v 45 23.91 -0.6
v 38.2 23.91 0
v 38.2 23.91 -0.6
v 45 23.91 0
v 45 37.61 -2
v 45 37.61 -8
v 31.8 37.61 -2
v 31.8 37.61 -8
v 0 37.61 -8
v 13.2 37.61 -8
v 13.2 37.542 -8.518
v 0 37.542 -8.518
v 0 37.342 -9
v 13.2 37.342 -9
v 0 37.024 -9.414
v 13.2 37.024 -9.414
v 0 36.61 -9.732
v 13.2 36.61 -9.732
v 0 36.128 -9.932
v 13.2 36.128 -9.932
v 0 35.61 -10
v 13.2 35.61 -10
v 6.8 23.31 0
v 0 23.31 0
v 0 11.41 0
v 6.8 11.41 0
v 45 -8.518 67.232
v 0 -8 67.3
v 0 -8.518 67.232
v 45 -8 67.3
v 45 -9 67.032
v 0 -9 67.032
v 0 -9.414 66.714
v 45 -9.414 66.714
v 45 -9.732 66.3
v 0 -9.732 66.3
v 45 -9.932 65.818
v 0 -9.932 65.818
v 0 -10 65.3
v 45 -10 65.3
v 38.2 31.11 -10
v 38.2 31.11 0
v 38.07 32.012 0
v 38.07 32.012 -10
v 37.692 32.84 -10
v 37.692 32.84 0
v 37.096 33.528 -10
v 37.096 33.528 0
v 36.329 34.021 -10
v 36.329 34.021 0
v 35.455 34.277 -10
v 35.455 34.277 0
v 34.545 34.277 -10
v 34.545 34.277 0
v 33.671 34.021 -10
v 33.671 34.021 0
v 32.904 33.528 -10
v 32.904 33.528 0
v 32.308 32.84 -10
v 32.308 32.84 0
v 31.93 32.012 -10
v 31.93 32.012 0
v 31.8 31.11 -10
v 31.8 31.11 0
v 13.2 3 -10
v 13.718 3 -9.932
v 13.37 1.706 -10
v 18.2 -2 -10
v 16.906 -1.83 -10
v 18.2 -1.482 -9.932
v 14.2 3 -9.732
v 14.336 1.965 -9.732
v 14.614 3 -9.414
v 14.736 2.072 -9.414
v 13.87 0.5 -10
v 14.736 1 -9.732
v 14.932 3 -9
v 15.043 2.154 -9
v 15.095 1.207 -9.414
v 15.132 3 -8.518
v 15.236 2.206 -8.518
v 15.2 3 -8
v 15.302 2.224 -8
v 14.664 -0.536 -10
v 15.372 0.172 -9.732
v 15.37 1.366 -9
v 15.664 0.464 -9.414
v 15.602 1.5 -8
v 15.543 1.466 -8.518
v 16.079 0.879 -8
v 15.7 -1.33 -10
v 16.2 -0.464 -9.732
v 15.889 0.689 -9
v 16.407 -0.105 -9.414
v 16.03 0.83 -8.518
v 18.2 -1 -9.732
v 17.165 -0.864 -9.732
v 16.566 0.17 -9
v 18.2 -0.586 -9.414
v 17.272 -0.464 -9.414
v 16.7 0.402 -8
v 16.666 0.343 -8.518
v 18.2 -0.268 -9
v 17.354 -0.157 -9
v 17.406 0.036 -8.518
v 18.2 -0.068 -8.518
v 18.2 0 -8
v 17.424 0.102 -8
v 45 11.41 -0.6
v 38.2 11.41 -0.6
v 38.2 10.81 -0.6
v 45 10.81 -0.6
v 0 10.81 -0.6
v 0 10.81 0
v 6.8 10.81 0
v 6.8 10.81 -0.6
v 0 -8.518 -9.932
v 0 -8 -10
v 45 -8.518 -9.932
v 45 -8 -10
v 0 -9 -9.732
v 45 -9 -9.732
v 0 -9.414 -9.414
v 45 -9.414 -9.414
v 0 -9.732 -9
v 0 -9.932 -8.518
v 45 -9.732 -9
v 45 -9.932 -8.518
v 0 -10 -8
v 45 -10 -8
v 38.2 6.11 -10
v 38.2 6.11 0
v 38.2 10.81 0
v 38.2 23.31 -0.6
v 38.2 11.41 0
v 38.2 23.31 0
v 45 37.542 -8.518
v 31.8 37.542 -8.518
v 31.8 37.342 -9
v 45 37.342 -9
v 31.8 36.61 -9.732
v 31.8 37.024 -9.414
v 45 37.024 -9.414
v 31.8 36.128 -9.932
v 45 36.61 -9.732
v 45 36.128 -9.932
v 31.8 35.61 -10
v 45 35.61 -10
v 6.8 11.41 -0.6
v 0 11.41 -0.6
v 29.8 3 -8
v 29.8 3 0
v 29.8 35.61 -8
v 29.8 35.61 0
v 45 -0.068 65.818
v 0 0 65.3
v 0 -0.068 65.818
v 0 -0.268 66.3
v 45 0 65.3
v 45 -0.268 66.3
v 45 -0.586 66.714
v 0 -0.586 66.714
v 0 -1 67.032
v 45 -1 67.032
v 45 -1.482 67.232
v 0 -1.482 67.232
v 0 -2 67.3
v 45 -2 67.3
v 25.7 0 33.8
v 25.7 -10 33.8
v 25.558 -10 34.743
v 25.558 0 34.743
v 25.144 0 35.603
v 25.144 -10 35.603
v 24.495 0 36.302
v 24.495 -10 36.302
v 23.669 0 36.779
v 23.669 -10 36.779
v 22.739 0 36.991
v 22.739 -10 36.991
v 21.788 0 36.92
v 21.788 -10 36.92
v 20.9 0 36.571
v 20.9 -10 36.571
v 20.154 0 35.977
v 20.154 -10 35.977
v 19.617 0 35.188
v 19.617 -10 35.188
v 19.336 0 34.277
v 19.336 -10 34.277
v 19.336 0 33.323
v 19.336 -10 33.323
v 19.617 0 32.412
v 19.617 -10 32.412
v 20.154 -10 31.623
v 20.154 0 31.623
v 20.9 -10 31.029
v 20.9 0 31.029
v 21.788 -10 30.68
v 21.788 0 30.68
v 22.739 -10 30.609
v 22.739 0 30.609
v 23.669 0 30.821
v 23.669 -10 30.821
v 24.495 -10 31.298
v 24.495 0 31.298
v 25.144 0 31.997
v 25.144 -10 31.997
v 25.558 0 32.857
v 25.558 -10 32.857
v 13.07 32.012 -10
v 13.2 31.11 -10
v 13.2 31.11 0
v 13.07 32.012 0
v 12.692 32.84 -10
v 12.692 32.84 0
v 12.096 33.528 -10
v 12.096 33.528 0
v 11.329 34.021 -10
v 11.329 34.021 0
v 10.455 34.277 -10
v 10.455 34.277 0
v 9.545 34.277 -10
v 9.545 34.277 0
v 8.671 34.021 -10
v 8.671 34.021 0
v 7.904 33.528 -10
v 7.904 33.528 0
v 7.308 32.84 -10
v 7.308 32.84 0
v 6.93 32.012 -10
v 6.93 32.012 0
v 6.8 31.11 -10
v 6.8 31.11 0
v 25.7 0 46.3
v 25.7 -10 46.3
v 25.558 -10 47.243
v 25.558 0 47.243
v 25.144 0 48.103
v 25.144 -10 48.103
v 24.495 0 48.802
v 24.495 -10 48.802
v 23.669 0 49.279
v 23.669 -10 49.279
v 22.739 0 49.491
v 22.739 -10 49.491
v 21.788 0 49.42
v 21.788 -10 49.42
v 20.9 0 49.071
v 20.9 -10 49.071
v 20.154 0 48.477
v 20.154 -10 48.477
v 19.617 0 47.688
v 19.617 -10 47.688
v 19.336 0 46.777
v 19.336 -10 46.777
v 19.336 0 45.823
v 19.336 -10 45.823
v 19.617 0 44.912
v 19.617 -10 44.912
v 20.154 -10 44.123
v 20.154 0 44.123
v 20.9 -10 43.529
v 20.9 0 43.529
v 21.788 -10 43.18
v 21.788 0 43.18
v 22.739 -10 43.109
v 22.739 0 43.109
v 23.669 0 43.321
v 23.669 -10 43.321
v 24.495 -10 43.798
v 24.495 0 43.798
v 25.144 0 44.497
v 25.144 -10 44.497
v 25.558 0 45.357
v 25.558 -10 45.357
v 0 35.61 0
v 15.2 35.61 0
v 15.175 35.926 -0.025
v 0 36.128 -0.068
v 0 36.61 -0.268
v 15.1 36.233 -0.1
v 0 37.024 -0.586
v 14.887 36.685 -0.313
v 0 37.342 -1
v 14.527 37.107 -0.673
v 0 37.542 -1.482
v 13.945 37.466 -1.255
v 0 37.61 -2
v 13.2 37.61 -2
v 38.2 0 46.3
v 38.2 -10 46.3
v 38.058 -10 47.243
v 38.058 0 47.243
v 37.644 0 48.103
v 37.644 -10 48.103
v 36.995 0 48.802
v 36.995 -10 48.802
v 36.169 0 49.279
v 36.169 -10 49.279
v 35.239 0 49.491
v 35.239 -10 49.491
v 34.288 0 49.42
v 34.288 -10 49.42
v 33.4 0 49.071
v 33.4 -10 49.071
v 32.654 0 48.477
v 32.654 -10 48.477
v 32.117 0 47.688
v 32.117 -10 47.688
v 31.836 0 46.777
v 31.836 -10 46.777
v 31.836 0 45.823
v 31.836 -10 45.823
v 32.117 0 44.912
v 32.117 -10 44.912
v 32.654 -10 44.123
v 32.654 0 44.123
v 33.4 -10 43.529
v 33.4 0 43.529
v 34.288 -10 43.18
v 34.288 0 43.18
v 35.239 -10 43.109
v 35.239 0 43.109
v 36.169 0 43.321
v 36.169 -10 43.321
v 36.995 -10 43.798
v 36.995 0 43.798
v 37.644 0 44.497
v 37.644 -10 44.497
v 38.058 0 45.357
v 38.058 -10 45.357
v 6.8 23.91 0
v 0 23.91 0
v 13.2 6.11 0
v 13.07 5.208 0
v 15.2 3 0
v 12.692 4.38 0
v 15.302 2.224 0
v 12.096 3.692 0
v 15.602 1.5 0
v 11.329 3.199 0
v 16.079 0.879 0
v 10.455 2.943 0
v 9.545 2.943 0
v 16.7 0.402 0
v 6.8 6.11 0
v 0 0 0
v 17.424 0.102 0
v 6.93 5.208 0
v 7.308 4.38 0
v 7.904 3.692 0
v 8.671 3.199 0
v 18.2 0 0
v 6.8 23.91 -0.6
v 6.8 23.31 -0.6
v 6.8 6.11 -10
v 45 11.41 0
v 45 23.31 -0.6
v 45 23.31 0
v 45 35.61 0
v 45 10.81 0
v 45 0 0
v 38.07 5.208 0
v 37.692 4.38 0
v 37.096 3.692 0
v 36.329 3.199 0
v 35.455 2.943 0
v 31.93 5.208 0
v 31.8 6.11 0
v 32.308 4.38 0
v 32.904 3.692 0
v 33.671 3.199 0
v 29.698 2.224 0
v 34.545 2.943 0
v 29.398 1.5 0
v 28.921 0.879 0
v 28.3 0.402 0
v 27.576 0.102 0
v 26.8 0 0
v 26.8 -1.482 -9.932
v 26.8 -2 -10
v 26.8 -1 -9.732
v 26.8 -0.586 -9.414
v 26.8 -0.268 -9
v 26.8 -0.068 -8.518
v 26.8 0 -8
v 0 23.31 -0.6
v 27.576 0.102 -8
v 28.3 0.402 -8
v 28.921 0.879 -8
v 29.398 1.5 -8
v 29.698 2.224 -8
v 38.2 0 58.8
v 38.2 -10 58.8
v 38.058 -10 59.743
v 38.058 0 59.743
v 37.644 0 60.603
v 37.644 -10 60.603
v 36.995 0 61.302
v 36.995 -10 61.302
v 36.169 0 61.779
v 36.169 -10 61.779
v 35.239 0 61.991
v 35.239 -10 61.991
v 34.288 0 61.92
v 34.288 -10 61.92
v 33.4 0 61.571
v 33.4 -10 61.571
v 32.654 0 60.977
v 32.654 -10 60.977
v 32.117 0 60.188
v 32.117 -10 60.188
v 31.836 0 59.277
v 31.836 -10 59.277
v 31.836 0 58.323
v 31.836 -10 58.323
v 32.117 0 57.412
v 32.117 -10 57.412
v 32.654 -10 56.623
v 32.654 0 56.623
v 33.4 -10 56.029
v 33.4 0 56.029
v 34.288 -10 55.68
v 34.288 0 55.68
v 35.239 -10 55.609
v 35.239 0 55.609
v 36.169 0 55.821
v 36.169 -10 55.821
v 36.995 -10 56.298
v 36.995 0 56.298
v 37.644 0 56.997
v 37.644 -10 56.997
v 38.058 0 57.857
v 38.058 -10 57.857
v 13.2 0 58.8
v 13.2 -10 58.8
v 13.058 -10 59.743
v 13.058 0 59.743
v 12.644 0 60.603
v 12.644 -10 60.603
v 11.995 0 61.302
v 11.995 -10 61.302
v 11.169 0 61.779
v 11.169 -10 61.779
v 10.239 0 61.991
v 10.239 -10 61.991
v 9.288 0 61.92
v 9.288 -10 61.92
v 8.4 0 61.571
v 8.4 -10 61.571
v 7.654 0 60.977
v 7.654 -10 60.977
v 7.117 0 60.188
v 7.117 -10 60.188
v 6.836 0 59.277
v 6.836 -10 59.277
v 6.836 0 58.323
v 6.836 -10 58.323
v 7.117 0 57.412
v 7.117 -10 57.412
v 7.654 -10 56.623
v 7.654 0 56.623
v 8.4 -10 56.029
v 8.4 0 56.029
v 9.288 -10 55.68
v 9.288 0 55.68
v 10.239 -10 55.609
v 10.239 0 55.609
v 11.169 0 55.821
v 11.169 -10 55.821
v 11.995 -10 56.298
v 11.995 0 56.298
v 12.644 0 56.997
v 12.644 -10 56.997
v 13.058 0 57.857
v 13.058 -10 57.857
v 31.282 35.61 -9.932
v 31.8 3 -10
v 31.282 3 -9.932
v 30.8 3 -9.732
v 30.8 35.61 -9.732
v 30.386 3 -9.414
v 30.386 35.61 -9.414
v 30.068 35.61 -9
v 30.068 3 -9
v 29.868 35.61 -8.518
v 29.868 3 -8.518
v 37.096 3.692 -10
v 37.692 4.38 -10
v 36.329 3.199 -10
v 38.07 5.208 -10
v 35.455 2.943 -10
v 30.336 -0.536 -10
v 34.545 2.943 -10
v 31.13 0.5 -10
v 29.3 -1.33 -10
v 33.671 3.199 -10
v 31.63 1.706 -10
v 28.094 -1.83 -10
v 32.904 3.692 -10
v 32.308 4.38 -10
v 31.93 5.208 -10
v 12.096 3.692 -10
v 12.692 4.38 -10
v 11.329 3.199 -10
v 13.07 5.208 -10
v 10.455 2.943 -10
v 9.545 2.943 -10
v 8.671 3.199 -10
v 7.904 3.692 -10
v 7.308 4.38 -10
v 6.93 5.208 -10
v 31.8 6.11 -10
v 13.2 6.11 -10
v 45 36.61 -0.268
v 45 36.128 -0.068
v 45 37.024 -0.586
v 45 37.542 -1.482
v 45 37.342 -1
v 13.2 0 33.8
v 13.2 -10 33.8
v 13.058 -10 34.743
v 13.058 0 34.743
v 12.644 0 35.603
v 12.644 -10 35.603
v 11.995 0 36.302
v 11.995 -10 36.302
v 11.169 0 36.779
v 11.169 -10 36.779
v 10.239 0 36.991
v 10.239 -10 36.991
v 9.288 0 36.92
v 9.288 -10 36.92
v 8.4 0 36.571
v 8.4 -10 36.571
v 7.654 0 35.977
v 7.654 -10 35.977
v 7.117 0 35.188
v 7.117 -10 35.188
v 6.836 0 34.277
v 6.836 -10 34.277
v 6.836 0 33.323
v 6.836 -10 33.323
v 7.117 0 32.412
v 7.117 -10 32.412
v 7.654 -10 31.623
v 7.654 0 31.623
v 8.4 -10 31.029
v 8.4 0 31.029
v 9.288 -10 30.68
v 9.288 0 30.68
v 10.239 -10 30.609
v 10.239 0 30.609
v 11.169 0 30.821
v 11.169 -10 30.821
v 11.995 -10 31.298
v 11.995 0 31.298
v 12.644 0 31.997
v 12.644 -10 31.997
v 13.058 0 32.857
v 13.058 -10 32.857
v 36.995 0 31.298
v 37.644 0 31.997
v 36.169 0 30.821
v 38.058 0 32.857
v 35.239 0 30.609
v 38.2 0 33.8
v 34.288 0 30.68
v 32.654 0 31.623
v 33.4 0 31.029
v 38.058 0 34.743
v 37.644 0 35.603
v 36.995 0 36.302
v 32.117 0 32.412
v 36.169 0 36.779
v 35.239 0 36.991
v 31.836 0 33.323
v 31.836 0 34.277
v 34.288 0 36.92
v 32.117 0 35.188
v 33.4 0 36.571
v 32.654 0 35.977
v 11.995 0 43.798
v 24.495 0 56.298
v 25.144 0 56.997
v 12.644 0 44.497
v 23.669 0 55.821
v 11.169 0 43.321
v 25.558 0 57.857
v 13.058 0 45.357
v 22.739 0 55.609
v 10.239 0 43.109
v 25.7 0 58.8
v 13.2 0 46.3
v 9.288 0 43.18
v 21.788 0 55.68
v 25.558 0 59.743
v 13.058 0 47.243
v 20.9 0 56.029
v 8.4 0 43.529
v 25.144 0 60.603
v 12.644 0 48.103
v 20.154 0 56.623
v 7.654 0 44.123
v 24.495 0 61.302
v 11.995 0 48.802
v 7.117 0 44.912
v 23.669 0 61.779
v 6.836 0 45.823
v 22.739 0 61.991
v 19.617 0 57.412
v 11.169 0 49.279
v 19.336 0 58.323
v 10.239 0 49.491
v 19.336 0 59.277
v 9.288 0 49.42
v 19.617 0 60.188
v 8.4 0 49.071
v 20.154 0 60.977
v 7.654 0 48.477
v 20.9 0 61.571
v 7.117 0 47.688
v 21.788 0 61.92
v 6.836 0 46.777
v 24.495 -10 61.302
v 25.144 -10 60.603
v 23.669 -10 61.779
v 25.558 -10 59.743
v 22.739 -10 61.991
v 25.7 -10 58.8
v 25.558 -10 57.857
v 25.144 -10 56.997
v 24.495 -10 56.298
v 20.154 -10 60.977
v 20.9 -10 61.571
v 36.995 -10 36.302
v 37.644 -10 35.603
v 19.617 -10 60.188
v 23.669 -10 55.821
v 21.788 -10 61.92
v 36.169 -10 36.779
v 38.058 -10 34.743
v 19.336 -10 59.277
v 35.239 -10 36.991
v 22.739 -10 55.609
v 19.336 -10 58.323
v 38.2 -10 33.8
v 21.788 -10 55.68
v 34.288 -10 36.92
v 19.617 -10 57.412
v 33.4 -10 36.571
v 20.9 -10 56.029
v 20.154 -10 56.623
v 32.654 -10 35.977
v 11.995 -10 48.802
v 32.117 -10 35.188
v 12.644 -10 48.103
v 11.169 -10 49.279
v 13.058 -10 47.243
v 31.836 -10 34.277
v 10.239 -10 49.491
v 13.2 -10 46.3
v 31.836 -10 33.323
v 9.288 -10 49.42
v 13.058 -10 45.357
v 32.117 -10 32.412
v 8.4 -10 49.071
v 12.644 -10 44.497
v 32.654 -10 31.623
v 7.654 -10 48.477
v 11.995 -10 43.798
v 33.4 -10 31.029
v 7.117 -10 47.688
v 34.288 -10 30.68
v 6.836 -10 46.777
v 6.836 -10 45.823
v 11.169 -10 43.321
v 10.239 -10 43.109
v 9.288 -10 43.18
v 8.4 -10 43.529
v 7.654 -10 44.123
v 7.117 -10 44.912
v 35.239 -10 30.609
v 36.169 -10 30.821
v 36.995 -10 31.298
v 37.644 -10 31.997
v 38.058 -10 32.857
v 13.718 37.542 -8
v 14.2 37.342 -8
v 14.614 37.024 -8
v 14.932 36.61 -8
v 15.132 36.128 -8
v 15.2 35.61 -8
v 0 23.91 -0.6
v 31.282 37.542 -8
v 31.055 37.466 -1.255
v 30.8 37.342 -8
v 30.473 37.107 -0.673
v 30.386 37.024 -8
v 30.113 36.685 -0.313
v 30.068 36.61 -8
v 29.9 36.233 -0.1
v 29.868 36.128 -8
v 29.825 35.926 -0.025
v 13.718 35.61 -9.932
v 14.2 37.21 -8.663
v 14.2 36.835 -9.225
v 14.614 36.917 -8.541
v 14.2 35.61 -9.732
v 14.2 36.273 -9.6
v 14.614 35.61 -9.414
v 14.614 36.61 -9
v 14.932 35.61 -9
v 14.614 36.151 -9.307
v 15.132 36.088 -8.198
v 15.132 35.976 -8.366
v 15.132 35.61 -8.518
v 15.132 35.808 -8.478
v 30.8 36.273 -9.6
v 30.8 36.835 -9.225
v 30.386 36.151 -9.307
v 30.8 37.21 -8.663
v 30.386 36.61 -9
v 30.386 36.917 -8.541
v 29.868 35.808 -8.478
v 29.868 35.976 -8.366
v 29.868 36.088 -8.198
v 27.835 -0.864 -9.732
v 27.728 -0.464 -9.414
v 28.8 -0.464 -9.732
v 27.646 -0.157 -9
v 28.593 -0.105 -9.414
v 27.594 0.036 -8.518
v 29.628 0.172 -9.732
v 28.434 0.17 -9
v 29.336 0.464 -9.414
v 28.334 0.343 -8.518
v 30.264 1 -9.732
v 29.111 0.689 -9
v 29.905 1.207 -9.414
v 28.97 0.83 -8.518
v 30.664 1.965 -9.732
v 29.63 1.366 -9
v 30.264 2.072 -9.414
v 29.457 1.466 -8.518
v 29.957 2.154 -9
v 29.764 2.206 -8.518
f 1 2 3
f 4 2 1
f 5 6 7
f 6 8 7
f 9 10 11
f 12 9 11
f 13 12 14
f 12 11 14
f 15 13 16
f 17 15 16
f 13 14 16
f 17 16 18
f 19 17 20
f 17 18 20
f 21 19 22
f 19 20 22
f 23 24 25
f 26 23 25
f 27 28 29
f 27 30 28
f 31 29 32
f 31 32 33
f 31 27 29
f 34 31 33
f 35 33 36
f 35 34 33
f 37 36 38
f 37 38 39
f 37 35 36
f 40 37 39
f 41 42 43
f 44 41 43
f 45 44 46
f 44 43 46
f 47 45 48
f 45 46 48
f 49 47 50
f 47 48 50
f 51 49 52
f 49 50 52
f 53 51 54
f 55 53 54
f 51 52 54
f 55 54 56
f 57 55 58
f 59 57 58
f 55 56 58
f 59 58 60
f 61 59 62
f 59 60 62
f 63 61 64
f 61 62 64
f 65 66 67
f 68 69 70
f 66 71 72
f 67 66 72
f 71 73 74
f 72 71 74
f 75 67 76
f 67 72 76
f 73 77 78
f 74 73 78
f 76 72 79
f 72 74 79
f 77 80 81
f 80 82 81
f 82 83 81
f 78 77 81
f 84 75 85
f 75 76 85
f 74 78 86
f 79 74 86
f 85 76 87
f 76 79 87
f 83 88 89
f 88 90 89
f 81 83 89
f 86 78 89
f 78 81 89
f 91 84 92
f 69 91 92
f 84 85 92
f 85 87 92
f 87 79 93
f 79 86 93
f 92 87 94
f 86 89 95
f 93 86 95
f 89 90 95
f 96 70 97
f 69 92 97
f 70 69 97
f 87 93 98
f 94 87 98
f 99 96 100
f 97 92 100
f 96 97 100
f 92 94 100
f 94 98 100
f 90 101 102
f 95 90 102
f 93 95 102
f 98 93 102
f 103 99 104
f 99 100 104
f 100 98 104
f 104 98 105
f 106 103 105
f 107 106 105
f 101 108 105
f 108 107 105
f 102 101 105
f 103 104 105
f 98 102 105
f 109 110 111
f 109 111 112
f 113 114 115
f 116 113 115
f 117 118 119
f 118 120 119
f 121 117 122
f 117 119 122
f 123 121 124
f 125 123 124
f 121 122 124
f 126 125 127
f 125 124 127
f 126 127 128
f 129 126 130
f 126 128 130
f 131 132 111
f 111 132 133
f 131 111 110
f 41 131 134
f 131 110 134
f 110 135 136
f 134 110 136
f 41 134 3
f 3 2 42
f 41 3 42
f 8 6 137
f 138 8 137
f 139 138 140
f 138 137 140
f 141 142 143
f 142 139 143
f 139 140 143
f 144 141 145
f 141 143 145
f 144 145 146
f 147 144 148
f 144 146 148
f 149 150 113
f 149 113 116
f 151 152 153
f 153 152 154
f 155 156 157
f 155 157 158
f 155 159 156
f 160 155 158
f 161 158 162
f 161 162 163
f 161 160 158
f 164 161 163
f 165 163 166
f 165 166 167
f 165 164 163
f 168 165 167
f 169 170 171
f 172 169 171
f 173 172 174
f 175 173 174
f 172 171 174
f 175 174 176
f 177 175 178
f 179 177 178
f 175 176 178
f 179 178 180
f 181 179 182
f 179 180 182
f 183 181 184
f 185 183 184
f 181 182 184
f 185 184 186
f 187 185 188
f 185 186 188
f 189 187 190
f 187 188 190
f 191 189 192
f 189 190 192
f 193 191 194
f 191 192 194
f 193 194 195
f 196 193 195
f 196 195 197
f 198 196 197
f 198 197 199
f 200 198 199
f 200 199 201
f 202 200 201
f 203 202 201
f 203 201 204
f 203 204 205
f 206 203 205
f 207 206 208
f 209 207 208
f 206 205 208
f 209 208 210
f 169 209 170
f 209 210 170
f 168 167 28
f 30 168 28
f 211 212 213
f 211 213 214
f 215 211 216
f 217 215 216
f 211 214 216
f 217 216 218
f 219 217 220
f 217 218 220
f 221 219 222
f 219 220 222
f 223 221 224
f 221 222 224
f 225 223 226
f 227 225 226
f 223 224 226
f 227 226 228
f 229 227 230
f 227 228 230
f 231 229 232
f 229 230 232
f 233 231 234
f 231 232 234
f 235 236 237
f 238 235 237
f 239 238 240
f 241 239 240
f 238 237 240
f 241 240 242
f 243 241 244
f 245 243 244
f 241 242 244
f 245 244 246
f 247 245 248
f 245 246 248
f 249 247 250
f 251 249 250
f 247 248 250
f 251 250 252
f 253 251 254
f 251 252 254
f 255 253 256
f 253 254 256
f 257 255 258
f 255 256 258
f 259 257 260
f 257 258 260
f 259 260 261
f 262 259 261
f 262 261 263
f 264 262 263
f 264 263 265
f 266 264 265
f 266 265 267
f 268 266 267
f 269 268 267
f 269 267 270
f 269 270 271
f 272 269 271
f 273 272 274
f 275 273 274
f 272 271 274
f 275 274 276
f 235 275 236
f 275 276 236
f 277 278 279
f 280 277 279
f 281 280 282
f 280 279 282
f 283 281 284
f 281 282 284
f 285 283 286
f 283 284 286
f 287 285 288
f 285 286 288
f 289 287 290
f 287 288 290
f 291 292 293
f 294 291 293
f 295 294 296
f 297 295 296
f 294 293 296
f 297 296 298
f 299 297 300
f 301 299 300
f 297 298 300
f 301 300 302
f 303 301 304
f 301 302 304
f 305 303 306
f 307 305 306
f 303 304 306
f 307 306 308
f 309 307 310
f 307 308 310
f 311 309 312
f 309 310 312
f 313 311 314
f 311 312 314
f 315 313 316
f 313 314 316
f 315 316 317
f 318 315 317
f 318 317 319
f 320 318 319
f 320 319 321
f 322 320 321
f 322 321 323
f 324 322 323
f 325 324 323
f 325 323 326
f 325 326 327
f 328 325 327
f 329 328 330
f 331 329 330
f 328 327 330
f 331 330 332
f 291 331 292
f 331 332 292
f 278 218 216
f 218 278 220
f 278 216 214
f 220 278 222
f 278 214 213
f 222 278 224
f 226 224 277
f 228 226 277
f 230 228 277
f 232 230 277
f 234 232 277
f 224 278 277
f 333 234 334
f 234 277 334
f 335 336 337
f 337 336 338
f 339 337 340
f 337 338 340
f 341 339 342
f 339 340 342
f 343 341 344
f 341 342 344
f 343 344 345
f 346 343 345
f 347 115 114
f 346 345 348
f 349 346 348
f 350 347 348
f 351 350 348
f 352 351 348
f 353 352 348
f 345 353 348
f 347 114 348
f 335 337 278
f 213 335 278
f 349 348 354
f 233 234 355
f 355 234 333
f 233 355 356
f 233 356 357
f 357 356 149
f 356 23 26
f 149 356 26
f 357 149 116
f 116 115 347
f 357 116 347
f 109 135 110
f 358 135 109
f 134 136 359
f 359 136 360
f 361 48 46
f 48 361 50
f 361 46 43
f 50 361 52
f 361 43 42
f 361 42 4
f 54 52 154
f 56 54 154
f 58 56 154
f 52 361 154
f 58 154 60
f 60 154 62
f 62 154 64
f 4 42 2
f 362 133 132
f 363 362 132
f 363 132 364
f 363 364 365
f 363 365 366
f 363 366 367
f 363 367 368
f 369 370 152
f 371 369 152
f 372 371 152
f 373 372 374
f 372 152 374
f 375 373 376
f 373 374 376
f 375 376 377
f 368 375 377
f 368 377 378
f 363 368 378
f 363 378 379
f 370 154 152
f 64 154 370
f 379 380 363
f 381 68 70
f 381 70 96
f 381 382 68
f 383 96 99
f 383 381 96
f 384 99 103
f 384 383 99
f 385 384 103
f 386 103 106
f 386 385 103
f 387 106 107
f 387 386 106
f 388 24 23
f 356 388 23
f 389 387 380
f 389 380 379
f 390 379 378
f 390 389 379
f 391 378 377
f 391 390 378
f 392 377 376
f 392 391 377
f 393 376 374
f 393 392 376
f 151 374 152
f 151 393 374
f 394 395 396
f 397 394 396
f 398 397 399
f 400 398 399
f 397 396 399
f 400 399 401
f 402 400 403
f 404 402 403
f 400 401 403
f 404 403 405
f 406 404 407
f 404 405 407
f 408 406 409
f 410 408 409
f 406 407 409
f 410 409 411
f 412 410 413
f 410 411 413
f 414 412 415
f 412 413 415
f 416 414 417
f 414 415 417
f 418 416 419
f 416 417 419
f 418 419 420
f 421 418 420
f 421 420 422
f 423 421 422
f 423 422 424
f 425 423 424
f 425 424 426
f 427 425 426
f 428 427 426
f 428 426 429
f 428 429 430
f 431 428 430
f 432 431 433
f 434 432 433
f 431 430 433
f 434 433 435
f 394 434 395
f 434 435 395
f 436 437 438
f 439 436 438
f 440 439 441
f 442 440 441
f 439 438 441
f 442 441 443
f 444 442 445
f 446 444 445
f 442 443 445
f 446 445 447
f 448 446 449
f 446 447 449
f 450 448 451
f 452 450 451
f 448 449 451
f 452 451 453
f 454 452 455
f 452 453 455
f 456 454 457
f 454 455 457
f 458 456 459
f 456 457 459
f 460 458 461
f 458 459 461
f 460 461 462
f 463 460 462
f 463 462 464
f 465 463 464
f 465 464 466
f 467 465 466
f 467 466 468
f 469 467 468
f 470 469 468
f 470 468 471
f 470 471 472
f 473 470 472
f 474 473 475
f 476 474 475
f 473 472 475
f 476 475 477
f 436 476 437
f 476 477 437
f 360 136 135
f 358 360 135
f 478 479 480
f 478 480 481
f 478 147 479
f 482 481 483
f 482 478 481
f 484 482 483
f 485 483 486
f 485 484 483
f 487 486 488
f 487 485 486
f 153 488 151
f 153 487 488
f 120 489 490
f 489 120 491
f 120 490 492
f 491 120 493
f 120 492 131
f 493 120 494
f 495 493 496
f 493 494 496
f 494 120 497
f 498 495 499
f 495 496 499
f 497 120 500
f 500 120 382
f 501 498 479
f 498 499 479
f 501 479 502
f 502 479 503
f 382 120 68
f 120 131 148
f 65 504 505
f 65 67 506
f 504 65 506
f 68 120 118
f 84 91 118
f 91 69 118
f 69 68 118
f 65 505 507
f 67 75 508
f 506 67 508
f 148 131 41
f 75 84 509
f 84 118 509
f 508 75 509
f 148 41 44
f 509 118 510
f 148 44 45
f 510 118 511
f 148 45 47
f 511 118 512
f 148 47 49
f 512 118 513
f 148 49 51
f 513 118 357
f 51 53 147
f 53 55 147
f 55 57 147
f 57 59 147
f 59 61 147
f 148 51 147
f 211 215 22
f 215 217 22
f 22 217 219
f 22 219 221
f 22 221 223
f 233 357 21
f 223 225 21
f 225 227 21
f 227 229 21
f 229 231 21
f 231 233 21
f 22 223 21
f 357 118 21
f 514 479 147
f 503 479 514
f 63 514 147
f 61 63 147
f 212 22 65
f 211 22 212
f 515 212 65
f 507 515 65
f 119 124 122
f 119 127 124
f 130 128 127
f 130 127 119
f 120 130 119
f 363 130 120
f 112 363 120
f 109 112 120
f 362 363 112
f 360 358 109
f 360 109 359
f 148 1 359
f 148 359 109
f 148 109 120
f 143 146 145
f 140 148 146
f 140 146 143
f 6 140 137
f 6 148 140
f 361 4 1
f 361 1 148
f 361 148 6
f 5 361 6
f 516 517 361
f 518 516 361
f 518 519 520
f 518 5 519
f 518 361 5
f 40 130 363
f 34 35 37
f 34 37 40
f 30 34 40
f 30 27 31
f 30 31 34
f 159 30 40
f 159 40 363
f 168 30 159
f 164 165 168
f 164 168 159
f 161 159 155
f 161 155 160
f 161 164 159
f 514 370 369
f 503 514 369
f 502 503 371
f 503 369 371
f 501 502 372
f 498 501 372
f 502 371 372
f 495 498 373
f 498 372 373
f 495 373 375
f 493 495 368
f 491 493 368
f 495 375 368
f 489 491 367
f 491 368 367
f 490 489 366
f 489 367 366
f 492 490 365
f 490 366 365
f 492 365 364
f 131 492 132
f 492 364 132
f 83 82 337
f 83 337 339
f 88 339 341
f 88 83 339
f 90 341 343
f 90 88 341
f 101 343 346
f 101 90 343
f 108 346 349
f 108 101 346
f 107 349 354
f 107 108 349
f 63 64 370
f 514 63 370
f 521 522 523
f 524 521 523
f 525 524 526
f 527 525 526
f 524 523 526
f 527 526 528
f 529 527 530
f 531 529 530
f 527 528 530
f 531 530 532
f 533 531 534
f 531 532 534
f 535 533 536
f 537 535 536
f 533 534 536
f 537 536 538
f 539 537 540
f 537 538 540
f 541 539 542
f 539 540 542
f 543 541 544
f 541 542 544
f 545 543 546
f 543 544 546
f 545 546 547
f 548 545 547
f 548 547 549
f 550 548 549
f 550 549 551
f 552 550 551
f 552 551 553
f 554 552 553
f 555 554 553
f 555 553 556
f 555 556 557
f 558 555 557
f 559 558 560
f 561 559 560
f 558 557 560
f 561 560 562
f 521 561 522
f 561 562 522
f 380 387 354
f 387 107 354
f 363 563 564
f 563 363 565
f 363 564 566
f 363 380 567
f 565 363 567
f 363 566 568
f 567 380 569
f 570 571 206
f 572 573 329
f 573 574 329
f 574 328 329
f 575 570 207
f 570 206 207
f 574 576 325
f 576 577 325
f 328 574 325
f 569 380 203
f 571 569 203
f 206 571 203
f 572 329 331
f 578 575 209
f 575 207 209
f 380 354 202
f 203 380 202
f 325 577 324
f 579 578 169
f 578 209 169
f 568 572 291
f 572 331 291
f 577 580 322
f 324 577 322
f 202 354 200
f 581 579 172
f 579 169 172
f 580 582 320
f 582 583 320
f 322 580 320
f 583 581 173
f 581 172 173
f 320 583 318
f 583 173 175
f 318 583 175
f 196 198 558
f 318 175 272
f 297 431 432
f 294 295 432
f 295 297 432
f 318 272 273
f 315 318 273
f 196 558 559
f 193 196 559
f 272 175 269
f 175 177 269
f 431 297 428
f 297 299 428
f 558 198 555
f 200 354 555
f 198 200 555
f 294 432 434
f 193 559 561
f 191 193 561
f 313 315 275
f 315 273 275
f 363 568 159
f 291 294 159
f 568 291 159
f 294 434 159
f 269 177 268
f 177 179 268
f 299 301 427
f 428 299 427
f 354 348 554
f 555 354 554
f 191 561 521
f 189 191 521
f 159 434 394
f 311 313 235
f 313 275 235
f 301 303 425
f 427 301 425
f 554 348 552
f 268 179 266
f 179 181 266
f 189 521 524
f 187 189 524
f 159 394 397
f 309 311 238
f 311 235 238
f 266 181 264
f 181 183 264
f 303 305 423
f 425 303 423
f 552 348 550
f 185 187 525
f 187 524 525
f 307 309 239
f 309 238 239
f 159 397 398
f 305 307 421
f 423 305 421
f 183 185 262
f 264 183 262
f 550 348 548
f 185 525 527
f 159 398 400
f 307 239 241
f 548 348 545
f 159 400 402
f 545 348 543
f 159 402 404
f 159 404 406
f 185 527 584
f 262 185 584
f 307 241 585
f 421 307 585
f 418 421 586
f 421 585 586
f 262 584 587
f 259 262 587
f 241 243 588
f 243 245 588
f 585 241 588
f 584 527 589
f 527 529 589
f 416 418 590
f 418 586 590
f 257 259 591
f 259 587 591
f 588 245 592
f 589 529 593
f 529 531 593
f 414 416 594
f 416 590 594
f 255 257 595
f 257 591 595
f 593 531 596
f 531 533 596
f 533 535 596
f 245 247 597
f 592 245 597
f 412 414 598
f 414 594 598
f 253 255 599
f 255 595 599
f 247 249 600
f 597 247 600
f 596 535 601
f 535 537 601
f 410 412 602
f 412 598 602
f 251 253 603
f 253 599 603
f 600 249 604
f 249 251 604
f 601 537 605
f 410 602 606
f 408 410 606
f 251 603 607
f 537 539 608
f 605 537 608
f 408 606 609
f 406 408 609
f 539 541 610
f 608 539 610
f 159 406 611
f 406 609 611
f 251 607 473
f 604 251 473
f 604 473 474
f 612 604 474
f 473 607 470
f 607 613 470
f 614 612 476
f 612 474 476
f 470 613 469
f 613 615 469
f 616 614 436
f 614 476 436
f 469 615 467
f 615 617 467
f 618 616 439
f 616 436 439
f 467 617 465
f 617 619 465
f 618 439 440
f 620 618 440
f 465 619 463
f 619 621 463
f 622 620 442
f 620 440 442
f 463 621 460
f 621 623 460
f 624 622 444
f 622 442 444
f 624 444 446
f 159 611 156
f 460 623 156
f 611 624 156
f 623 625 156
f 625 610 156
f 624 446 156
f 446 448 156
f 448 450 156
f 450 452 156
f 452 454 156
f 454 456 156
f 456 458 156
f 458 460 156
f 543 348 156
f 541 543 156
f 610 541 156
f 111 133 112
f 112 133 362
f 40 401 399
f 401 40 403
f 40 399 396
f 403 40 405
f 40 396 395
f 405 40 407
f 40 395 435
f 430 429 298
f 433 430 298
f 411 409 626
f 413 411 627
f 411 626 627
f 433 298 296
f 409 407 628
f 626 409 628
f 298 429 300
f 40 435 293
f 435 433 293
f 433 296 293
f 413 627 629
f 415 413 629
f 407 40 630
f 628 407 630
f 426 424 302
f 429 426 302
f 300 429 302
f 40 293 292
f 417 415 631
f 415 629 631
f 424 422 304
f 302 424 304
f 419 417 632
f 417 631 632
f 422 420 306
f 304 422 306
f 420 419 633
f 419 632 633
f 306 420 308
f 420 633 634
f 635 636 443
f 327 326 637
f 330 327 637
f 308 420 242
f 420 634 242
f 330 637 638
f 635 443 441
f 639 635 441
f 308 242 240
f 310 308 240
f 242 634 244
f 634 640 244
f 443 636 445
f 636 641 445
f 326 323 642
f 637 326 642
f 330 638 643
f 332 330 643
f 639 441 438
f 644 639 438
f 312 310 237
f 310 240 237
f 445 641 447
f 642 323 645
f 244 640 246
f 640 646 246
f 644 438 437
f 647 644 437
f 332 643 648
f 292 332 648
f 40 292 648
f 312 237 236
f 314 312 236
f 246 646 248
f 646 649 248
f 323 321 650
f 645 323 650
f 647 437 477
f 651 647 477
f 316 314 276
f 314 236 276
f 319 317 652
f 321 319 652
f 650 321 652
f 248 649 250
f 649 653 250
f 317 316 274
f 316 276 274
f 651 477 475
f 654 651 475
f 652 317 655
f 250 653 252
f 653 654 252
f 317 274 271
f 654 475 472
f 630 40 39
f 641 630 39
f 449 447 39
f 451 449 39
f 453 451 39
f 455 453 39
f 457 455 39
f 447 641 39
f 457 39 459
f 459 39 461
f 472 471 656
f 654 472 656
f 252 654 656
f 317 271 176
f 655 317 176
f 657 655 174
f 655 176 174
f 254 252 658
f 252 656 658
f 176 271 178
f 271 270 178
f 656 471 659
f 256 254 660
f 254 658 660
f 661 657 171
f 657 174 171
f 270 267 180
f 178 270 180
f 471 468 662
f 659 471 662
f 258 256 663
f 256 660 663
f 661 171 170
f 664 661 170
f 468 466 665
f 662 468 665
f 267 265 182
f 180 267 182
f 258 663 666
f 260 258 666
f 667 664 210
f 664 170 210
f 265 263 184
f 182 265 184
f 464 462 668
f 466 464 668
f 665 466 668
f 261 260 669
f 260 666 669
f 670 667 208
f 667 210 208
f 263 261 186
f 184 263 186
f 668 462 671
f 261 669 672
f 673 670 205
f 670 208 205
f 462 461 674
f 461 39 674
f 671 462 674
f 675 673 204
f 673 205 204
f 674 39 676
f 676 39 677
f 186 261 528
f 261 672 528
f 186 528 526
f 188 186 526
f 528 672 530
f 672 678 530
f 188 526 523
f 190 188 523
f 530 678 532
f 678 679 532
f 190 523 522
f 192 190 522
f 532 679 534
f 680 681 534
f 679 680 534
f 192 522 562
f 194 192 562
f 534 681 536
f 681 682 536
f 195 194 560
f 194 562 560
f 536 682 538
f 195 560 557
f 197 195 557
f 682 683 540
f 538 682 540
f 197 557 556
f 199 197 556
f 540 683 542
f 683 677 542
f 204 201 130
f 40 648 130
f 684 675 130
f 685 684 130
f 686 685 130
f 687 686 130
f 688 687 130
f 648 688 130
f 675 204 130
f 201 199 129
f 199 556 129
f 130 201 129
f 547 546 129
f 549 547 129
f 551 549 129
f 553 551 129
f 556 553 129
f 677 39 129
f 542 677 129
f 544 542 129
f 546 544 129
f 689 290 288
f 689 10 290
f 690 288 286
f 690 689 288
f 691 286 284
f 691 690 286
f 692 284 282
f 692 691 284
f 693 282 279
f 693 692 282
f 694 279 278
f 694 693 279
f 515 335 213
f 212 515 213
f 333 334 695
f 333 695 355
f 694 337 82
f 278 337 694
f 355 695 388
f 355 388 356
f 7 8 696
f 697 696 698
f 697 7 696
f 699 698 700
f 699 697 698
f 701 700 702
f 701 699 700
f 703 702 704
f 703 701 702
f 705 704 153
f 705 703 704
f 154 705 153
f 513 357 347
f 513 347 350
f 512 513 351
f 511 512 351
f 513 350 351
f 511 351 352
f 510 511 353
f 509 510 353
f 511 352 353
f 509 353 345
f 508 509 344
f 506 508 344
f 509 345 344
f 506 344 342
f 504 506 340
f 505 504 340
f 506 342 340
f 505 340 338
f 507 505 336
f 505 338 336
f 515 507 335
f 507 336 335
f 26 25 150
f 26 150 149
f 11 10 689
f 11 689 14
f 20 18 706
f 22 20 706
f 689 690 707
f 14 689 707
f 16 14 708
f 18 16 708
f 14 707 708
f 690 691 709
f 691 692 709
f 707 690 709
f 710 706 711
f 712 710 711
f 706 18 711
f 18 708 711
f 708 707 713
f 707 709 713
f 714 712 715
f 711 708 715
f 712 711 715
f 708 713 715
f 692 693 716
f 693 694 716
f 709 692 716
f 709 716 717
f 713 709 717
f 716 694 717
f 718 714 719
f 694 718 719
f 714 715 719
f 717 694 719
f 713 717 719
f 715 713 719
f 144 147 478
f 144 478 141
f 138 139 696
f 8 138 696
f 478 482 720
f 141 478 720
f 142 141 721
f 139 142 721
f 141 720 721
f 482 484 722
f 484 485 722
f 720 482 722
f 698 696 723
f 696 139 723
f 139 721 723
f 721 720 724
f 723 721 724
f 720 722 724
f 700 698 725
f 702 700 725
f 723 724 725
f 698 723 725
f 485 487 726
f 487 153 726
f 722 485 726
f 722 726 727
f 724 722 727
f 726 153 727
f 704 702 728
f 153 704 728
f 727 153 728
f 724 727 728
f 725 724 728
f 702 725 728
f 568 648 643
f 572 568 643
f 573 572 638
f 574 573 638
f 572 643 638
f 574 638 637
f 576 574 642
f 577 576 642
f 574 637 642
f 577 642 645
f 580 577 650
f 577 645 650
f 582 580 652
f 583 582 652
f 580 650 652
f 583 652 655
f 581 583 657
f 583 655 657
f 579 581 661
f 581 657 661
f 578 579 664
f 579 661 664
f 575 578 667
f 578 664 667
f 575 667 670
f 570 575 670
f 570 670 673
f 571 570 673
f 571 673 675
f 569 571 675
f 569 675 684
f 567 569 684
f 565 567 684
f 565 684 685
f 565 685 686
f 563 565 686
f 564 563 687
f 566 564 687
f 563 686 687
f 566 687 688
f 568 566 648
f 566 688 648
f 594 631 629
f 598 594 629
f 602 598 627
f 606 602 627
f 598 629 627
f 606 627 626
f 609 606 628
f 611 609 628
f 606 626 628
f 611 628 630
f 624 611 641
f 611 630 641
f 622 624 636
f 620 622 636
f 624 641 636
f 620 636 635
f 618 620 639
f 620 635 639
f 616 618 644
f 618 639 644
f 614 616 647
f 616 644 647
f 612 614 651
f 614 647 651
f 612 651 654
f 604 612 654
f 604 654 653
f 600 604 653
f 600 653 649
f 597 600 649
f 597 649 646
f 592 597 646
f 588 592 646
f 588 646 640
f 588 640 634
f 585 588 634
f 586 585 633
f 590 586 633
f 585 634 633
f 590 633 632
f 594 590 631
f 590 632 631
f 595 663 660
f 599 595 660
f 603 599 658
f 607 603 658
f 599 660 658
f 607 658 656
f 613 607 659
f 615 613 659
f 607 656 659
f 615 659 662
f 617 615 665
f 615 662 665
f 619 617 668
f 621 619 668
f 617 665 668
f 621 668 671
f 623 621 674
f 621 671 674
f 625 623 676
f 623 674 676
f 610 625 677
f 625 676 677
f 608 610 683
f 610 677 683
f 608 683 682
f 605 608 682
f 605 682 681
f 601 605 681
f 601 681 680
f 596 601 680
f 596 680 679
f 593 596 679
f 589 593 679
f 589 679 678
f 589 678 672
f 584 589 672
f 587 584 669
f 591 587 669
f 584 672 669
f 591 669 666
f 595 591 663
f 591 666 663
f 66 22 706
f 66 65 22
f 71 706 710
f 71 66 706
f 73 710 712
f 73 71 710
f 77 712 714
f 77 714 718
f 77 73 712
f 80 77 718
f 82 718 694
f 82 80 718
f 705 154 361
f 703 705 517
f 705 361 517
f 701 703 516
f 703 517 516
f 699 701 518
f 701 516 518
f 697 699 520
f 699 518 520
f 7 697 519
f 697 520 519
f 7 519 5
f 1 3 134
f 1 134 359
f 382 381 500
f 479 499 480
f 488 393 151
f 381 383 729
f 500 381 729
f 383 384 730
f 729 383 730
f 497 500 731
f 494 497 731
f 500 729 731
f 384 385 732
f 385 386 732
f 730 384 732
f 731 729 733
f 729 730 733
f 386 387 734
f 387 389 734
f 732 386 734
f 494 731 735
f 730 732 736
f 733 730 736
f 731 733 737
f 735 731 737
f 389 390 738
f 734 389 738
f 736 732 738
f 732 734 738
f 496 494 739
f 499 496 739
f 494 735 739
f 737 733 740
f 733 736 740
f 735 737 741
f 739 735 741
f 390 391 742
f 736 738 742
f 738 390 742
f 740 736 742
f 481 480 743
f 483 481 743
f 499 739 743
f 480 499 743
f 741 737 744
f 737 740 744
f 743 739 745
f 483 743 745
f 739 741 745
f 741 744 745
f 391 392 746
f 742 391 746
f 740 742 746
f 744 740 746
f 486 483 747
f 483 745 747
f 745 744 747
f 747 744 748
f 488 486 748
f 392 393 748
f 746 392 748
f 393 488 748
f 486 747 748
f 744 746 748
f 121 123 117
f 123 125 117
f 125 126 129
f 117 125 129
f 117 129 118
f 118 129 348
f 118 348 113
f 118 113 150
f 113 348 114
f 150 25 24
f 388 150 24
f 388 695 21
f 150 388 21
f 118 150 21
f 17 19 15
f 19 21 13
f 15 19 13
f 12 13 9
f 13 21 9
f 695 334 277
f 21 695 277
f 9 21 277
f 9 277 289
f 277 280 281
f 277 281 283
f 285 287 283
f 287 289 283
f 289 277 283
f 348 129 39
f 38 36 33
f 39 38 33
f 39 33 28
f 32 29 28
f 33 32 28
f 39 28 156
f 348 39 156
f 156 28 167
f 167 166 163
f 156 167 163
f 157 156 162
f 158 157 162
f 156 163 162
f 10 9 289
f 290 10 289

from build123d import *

# Parameters (mm, degrees)
F1_DEPTH  = 45
F3_DEPTH  = 10
F4_R      = 2
F5_R      = 3.2
F6_DEPTH  = 10
F2_W      = 14.6
F2_H      = 37.61
F7_DEPTH  = 10
F8_R      = 3
F9_R      = 1.99999
F2_W_2    = 6.8
F2_H_2    = 0.6
F10_DEPTH = 0.6


# Not quite as in the source:
# - a fillet or chamfer is up to 0.001 mm smaller than in the source, because OpenCascade refuses the exact size
# - a feature names something its author has since deleted; it is built from what else it names


with BuildPart() as f1:
    # F0 (on Right) → F1 (new body)
    with BuildSketch(Plane.YZ):
        Polygon((37.61, 0), (0, 0), (0, 67.3), (-10, 67.3), (-10, -10), (37.61, -10), align=None)
    extrude(amount=F1_DEPTH)

    # F2 (on face) → F3 (cut)
    with BuildSketch(Plane.XY):
        with BuildLine():
            Line((13.2, 6.11), (13.2, 31.11))
            ThreePointArc((13.2, 31.11), (10, 34.31), (6.8, 31.11))
            Line((6.8, 31.11), (6.8, 23.91))
            Line((6.8, 23.91), (6.8, 23.31))
            Line((6.8, 23.31), (6.8, 11.41))
            Line((6.8, 11.41), (6.8, 10.81))
            Line((6.8, 10.81), (6.8, 6.11))
            ThreePointArc((6.8, 6.11), (10, 2.91), (13.2, 6.11))
        make_face()
        with BuildLine():
            Line((38.2, 23.31), (38.2, 23.91))
            Line((38.2, 23.91), (38.2, 31.11))
            ThreePointArc((38.2, 31.11), (35, 34.31), (31.8, 31.11))
            Line((31.8, 31.11), (31.8, 6.11))
            ThreePointArc((31.8, 6.11), (35, 2.91), (38.2, 6.11))
            Line((38.2, 6.11), (38.2, 10.81))
            Line((38.2, 10.81), (38.2, 11.41))
            Line((38.2, 11.41), (38.2, 23.31))
        make_face()
    extrude(amount=-F3_DEPTH, mode=Mode.SUBTRACT)

    # F4
    f4_edges = [f1.edges().sort_by_distance(p)[0] for p in [
        (22.5, 37.61, -10),
        (22.5, -10, -10),
        (22.5, 0, 67.3),
        (22.5, -10, 67.3),
    ]]
    fillet(f4_edges, radius=F4_R)

    # F5 (on face) → F6 (cut)
    with BuildSketch(Plane.XZ.offset(10)):
        with Locations((10, 58.8)):
            Circle(F5_R)
        with Locations((22.5, 58.8)):
            Circle(F5_R)
        with Locations((35, 58.8)):
            Circle(F5_R)
        with Locations((35, 46.3)):
            Circle(F5_R)
        with Locations((22.5, 46.3)):
            Circle(F5_R)
        with Locations((10, 46.3)):
            Circle(F5_R)
        with Locations((10, 33.8)):
            Circle(F5_R)
        with Locations((22.5, 33.8)):
            Circle(F5_R)
        with Locations((35, 33.8)):
            Circle(F5_R)
    extrude(amount=-F6_DEPTH, mode=Mode.SUBTRACT)

    # F2 (on face) → F7 (cut)
    with BuildSketch(Plane.XY):
        with Locations((22.5, 18.805)):
            Rectangle(F2_W, F2_H)
    extrude(amount=-F7_DEPTH, mode=Mode.SUBTRACT)

    # F8
    f8_edges = [f1.edges().sort_by_distance(p)[0] for p in [
        (29.8, 0, -5),
        (15.2, 0, -5),
    ]]
    fillet(f8_edges, radius=F8_R)

    # F9 (radius 2 in the source; OpenCascade refuses exactly that, so slightly less here)
    f9_edges = [f1.edges().sort_by_distance(p)[0] for p in [
        (15.2, 37.61, -4),
        (15.2, 37.024214, -9.414214),
        (37.4, 37.61, 0),
        (7.6, 37.61, 0),
    ]]
    fillet(f9_edges, radius=F9_R)

    # F2 (on face) → F10 (cut)
    with BuildSketch(Plane.XY):
        with Locations((3.4, 11.11)):
            Rectangle(F2_W_2, F2_H_2)
        with Locations((3.4, 23.61)):
            Rectangle(F2_W_2, F2_H_2)
        with Locations((41.6, 11.11)):
            Rectangle(F2_W_2, F2_H_2)
        with Locations((41.6, 23.61)):
            Rectangle(F2_W_2, F2_H_2)
    extrude(amount=-F10_DEPTH, mode=Mode.SUBTRACT)


solid = f1.part
